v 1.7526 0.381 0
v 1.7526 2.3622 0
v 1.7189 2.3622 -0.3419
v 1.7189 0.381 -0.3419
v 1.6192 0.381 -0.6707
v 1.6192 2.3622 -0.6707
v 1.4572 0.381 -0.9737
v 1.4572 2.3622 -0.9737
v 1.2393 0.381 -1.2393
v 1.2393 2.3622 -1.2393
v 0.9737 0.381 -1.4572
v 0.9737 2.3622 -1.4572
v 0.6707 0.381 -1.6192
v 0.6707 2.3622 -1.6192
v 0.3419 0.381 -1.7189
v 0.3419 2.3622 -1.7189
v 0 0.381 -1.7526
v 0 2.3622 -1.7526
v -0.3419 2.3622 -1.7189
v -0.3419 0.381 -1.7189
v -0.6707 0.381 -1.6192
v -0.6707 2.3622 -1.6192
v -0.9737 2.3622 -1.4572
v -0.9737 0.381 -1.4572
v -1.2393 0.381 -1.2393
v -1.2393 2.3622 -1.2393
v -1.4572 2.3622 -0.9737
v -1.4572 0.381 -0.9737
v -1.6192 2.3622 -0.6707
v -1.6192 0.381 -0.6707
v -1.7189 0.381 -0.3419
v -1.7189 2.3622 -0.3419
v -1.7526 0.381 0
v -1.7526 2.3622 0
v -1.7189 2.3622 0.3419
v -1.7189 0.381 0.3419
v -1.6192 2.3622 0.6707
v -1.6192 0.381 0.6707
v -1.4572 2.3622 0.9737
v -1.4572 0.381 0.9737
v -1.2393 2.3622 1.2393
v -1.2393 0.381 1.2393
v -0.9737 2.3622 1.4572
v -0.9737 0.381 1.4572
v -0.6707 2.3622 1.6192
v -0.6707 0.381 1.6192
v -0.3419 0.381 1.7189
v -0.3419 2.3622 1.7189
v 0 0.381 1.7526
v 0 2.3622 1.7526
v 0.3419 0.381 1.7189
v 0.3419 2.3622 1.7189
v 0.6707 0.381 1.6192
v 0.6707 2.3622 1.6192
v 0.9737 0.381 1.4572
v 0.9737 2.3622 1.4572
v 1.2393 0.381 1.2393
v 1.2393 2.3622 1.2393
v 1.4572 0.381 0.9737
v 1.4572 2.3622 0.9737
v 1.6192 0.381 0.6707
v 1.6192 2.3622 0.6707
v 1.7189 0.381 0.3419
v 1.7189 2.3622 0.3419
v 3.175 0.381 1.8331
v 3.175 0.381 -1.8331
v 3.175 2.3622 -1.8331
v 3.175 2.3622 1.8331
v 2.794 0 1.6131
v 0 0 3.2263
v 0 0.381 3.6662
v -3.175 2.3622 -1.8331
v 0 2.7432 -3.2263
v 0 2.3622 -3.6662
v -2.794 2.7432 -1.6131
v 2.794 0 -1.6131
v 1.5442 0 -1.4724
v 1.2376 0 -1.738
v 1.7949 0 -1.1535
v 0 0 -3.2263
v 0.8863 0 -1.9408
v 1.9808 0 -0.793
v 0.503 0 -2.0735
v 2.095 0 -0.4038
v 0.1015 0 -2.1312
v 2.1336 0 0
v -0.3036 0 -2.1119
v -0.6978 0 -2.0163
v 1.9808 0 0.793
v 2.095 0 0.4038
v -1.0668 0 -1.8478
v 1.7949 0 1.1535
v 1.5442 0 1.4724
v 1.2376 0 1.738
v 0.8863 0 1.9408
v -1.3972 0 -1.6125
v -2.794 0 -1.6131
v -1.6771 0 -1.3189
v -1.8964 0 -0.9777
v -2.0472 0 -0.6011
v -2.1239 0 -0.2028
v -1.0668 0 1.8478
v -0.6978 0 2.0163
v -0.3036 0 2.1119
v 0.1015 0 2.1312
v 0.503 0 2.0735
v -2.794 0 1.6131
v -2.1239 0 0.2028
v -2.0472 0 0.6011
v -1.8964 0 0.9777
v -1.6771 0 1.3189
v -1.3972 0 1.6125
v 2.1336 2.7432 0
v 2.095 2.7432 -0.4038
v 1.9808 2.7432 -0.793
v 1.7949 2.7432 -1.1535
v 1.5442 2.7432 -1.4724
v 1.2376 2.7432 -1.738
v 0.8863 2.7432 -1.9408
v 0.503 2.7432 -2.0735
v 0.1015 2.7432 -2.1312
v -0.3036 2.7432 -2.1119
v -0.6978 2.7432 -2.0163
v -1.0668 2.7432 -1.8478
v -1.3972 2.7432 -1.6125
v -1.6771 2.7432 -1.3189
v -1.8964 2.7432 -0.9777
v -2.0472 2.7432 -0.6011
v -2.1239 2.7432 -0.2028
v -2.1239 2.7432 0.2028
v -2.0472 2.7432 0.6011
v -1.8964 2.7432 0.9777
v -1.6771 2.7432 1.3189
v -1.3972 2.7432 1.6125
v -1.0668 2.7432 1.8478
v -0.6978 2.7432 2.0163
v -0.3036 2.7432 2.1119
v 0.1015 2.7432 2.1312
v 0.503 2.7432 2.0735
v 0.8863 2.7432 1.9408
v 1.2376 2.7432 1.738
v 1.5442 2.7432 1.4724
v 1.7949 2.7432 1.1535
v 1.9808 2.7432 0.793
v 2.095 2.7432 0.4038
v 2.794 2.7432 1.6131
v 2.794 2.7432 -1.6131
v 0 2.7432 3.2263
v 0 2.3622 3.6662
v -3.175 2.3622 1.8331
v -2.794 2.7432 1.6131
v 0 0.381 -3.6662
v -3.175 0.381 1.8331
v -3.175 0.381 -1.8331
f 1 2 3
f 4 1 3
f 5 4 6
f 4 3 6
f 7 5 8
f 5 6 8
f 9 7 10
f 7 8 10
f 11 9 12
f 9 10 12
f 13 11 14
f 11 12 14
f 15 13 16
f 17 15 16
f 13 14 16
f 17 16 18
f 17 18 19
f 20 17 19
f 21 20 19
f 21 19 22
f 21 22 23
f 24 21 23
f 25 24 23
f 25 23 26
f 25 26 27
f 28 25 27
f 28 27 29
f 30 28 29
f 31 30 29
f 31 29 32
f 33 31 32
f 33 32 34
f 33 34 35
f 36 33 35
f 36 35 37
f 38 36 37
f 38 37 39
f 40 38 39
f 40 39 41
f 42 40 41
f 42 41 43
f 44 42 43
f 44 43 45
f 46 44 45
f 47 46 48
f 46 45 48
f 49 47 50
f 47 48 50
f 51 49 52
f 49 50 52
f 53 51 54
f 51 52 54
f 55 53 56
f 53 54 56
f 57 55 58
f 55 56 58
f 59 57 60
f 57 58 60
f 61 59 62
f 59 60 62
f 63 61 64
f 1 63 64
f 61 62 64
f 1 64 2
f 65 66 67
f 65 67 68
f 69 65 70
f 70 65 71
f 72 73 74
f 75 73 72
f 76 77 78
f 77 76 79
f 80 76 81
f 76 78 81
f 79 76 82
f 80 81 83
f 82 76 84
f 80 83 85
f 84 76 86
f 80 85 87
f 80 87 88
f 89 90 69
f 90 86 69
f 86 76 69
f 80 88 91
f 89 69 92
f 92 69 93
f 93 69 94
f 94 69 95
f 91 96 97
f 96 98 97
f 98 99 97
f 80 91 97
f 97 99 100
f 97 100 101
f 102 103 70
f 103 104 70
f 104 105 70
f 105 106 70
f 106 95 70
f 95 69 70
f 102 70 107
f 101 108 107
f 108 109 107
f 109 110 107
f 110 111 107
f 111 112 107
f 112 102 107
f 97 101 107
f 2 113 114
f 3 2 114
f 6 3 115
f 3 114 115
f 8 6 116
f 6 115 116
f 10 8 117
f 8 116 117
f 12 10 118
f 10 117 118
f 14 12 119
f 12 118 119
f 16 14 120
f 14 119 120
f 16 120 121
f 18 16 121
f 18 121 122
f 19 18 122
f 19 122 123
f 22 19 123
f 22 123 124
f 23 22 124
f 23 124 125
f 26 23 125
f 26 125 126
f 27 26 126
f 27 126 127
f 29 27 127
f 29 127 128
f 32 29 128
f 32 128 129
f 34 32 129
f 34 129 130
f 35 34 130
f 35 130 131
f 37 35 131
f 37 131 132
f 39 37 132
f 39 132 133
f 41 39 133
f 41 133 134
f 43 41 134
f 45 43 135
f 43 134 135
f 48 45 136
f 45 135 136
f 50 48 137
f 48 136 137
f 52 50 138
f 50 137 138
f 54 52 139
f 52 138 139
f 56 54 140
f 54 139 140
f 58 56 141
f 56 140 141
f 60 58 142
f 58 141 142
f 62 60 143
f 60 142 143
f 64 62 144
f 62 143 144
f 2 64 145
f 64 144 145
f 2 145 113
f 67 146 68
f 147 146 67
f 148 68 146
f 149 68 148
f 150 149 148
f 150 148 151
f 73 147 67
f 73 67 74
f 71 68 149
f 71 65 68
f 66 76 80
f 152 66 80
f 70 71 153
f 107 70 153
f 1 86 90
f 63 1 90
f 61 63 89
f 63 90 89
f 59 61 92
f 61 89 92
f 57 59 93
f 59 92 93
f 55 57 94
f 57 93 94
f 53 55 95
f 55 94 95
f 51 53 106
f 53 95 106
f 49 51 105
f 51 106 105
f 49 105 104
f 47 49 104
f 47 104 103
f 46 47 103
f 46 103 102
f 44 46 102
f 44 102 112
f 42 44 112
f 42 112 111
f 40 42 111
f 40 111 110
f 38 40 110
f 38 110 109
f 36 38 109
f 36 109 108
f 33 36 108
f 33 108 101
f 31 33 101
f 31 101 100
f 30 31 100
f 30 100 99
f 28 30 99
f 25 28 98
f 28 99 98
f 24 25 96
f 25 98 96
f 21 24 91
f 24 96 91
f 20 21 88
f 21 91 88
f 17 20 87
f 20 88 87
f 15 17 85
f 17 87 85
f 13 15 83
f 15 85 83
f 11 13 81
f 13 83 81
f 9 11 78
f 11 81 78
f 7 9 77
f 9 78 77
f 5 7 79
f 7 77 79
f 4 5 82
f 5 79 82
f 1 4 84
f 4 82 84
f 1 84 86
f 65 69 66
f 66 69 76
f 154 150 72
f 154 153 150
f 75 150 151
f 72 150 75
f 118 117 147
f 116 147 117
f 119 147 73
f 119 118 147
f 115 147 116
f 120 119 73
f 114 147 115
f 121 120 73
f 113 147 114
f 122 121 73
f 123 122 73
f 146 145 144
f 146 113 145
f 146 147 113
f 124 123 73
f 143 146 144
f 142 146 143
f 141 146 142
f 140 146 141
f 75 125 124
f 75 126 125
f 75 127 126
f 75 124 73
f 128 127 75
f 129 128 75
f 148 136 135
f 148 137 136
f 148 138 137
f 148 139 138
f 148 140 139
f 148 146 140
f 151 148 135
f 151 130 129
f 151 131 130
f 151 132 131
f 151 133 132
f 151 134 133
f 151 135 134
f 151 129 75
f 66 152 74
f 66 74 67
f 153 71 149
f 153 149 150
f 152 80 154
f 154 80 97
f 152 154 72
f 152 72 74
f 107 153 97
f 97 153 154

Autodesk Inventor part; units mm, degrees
ref_plane "YZ Plane" through (0, 0, 0) normal (1, 0, 0) x (0, 1, 0)
ref_plane "XZ Plane" through (0, 0, 0) normal (0, 1, 0) x (-1, 0, 0)
ref_plane "XY Plane" through (0, 0, 0) normal (0, 0, 1) x (1, 0, 0)
sketch "Sketch1" plane through (0, 0, 0) normal (0, 1, 0) x (-1, 0, 0)
  line L0 (0, -3.6662) -> (-3.175, -1.8331)
  line L1 (-3.175, -1.8331) -> (-3.175, 1.8331)
  line L2 (-3.175, 1.8331) -> (0, 3.6662)
  line L3 (0, 3.6662) -> (3.175, 1.8331)
  line L4 (3.175, 1.8331) -> (3.175, -1.8331)
  line L5 (3.175, -1.8331) -> (0, -3.6662)
  line L6 (0, 3.6662) -> (0, -3.6662) construction
  point P0 (0, 0)
  point P1 (0, 0)
  dimension "d0" = 6.35
extrude "Extrusion1" add sketch "Sketch1" along normal blind 2.7432
sketch "Sketch2" plane through (0, 2.7432, 0) normal (0, 1, 0) x (1, 0, 0)
  circle A0 centre (0, 0) radius 1.7526
  dimension "d3" = 3.5052
extrude "Extrusion2" cut sketch "Sketch2" against normal blind 2.7432
chamfer "Chamfer1" distance 0.381 angle 45 14 edges at (1.5875, 2.7432, 2.7496) (-1.5875, 2.7432, 2.7496) (-3.175, 2.7432, 0) (-1.5875, 2.7432, -2.7496) (1.5875, 2.7432, -2.7496) (3.175, 2.7432, 0) (-1.7526, 2.7432, 0) (3.175, 0, 0) (1.5875, 0, 2.7496) (-1.5875, 0, 2.7496) (-3.175, 0, 0) (-1.5875, 0, -2.7496) (1.5875, 0, -2.7496) (-1.7526, 0, 0)
thread "Thread1" size "6-32 UNC" class "2B" standard "ANSI Unified Screw Threads" full length
properties part number "6-32x0,25 Nut" material "Stainless Steel"
